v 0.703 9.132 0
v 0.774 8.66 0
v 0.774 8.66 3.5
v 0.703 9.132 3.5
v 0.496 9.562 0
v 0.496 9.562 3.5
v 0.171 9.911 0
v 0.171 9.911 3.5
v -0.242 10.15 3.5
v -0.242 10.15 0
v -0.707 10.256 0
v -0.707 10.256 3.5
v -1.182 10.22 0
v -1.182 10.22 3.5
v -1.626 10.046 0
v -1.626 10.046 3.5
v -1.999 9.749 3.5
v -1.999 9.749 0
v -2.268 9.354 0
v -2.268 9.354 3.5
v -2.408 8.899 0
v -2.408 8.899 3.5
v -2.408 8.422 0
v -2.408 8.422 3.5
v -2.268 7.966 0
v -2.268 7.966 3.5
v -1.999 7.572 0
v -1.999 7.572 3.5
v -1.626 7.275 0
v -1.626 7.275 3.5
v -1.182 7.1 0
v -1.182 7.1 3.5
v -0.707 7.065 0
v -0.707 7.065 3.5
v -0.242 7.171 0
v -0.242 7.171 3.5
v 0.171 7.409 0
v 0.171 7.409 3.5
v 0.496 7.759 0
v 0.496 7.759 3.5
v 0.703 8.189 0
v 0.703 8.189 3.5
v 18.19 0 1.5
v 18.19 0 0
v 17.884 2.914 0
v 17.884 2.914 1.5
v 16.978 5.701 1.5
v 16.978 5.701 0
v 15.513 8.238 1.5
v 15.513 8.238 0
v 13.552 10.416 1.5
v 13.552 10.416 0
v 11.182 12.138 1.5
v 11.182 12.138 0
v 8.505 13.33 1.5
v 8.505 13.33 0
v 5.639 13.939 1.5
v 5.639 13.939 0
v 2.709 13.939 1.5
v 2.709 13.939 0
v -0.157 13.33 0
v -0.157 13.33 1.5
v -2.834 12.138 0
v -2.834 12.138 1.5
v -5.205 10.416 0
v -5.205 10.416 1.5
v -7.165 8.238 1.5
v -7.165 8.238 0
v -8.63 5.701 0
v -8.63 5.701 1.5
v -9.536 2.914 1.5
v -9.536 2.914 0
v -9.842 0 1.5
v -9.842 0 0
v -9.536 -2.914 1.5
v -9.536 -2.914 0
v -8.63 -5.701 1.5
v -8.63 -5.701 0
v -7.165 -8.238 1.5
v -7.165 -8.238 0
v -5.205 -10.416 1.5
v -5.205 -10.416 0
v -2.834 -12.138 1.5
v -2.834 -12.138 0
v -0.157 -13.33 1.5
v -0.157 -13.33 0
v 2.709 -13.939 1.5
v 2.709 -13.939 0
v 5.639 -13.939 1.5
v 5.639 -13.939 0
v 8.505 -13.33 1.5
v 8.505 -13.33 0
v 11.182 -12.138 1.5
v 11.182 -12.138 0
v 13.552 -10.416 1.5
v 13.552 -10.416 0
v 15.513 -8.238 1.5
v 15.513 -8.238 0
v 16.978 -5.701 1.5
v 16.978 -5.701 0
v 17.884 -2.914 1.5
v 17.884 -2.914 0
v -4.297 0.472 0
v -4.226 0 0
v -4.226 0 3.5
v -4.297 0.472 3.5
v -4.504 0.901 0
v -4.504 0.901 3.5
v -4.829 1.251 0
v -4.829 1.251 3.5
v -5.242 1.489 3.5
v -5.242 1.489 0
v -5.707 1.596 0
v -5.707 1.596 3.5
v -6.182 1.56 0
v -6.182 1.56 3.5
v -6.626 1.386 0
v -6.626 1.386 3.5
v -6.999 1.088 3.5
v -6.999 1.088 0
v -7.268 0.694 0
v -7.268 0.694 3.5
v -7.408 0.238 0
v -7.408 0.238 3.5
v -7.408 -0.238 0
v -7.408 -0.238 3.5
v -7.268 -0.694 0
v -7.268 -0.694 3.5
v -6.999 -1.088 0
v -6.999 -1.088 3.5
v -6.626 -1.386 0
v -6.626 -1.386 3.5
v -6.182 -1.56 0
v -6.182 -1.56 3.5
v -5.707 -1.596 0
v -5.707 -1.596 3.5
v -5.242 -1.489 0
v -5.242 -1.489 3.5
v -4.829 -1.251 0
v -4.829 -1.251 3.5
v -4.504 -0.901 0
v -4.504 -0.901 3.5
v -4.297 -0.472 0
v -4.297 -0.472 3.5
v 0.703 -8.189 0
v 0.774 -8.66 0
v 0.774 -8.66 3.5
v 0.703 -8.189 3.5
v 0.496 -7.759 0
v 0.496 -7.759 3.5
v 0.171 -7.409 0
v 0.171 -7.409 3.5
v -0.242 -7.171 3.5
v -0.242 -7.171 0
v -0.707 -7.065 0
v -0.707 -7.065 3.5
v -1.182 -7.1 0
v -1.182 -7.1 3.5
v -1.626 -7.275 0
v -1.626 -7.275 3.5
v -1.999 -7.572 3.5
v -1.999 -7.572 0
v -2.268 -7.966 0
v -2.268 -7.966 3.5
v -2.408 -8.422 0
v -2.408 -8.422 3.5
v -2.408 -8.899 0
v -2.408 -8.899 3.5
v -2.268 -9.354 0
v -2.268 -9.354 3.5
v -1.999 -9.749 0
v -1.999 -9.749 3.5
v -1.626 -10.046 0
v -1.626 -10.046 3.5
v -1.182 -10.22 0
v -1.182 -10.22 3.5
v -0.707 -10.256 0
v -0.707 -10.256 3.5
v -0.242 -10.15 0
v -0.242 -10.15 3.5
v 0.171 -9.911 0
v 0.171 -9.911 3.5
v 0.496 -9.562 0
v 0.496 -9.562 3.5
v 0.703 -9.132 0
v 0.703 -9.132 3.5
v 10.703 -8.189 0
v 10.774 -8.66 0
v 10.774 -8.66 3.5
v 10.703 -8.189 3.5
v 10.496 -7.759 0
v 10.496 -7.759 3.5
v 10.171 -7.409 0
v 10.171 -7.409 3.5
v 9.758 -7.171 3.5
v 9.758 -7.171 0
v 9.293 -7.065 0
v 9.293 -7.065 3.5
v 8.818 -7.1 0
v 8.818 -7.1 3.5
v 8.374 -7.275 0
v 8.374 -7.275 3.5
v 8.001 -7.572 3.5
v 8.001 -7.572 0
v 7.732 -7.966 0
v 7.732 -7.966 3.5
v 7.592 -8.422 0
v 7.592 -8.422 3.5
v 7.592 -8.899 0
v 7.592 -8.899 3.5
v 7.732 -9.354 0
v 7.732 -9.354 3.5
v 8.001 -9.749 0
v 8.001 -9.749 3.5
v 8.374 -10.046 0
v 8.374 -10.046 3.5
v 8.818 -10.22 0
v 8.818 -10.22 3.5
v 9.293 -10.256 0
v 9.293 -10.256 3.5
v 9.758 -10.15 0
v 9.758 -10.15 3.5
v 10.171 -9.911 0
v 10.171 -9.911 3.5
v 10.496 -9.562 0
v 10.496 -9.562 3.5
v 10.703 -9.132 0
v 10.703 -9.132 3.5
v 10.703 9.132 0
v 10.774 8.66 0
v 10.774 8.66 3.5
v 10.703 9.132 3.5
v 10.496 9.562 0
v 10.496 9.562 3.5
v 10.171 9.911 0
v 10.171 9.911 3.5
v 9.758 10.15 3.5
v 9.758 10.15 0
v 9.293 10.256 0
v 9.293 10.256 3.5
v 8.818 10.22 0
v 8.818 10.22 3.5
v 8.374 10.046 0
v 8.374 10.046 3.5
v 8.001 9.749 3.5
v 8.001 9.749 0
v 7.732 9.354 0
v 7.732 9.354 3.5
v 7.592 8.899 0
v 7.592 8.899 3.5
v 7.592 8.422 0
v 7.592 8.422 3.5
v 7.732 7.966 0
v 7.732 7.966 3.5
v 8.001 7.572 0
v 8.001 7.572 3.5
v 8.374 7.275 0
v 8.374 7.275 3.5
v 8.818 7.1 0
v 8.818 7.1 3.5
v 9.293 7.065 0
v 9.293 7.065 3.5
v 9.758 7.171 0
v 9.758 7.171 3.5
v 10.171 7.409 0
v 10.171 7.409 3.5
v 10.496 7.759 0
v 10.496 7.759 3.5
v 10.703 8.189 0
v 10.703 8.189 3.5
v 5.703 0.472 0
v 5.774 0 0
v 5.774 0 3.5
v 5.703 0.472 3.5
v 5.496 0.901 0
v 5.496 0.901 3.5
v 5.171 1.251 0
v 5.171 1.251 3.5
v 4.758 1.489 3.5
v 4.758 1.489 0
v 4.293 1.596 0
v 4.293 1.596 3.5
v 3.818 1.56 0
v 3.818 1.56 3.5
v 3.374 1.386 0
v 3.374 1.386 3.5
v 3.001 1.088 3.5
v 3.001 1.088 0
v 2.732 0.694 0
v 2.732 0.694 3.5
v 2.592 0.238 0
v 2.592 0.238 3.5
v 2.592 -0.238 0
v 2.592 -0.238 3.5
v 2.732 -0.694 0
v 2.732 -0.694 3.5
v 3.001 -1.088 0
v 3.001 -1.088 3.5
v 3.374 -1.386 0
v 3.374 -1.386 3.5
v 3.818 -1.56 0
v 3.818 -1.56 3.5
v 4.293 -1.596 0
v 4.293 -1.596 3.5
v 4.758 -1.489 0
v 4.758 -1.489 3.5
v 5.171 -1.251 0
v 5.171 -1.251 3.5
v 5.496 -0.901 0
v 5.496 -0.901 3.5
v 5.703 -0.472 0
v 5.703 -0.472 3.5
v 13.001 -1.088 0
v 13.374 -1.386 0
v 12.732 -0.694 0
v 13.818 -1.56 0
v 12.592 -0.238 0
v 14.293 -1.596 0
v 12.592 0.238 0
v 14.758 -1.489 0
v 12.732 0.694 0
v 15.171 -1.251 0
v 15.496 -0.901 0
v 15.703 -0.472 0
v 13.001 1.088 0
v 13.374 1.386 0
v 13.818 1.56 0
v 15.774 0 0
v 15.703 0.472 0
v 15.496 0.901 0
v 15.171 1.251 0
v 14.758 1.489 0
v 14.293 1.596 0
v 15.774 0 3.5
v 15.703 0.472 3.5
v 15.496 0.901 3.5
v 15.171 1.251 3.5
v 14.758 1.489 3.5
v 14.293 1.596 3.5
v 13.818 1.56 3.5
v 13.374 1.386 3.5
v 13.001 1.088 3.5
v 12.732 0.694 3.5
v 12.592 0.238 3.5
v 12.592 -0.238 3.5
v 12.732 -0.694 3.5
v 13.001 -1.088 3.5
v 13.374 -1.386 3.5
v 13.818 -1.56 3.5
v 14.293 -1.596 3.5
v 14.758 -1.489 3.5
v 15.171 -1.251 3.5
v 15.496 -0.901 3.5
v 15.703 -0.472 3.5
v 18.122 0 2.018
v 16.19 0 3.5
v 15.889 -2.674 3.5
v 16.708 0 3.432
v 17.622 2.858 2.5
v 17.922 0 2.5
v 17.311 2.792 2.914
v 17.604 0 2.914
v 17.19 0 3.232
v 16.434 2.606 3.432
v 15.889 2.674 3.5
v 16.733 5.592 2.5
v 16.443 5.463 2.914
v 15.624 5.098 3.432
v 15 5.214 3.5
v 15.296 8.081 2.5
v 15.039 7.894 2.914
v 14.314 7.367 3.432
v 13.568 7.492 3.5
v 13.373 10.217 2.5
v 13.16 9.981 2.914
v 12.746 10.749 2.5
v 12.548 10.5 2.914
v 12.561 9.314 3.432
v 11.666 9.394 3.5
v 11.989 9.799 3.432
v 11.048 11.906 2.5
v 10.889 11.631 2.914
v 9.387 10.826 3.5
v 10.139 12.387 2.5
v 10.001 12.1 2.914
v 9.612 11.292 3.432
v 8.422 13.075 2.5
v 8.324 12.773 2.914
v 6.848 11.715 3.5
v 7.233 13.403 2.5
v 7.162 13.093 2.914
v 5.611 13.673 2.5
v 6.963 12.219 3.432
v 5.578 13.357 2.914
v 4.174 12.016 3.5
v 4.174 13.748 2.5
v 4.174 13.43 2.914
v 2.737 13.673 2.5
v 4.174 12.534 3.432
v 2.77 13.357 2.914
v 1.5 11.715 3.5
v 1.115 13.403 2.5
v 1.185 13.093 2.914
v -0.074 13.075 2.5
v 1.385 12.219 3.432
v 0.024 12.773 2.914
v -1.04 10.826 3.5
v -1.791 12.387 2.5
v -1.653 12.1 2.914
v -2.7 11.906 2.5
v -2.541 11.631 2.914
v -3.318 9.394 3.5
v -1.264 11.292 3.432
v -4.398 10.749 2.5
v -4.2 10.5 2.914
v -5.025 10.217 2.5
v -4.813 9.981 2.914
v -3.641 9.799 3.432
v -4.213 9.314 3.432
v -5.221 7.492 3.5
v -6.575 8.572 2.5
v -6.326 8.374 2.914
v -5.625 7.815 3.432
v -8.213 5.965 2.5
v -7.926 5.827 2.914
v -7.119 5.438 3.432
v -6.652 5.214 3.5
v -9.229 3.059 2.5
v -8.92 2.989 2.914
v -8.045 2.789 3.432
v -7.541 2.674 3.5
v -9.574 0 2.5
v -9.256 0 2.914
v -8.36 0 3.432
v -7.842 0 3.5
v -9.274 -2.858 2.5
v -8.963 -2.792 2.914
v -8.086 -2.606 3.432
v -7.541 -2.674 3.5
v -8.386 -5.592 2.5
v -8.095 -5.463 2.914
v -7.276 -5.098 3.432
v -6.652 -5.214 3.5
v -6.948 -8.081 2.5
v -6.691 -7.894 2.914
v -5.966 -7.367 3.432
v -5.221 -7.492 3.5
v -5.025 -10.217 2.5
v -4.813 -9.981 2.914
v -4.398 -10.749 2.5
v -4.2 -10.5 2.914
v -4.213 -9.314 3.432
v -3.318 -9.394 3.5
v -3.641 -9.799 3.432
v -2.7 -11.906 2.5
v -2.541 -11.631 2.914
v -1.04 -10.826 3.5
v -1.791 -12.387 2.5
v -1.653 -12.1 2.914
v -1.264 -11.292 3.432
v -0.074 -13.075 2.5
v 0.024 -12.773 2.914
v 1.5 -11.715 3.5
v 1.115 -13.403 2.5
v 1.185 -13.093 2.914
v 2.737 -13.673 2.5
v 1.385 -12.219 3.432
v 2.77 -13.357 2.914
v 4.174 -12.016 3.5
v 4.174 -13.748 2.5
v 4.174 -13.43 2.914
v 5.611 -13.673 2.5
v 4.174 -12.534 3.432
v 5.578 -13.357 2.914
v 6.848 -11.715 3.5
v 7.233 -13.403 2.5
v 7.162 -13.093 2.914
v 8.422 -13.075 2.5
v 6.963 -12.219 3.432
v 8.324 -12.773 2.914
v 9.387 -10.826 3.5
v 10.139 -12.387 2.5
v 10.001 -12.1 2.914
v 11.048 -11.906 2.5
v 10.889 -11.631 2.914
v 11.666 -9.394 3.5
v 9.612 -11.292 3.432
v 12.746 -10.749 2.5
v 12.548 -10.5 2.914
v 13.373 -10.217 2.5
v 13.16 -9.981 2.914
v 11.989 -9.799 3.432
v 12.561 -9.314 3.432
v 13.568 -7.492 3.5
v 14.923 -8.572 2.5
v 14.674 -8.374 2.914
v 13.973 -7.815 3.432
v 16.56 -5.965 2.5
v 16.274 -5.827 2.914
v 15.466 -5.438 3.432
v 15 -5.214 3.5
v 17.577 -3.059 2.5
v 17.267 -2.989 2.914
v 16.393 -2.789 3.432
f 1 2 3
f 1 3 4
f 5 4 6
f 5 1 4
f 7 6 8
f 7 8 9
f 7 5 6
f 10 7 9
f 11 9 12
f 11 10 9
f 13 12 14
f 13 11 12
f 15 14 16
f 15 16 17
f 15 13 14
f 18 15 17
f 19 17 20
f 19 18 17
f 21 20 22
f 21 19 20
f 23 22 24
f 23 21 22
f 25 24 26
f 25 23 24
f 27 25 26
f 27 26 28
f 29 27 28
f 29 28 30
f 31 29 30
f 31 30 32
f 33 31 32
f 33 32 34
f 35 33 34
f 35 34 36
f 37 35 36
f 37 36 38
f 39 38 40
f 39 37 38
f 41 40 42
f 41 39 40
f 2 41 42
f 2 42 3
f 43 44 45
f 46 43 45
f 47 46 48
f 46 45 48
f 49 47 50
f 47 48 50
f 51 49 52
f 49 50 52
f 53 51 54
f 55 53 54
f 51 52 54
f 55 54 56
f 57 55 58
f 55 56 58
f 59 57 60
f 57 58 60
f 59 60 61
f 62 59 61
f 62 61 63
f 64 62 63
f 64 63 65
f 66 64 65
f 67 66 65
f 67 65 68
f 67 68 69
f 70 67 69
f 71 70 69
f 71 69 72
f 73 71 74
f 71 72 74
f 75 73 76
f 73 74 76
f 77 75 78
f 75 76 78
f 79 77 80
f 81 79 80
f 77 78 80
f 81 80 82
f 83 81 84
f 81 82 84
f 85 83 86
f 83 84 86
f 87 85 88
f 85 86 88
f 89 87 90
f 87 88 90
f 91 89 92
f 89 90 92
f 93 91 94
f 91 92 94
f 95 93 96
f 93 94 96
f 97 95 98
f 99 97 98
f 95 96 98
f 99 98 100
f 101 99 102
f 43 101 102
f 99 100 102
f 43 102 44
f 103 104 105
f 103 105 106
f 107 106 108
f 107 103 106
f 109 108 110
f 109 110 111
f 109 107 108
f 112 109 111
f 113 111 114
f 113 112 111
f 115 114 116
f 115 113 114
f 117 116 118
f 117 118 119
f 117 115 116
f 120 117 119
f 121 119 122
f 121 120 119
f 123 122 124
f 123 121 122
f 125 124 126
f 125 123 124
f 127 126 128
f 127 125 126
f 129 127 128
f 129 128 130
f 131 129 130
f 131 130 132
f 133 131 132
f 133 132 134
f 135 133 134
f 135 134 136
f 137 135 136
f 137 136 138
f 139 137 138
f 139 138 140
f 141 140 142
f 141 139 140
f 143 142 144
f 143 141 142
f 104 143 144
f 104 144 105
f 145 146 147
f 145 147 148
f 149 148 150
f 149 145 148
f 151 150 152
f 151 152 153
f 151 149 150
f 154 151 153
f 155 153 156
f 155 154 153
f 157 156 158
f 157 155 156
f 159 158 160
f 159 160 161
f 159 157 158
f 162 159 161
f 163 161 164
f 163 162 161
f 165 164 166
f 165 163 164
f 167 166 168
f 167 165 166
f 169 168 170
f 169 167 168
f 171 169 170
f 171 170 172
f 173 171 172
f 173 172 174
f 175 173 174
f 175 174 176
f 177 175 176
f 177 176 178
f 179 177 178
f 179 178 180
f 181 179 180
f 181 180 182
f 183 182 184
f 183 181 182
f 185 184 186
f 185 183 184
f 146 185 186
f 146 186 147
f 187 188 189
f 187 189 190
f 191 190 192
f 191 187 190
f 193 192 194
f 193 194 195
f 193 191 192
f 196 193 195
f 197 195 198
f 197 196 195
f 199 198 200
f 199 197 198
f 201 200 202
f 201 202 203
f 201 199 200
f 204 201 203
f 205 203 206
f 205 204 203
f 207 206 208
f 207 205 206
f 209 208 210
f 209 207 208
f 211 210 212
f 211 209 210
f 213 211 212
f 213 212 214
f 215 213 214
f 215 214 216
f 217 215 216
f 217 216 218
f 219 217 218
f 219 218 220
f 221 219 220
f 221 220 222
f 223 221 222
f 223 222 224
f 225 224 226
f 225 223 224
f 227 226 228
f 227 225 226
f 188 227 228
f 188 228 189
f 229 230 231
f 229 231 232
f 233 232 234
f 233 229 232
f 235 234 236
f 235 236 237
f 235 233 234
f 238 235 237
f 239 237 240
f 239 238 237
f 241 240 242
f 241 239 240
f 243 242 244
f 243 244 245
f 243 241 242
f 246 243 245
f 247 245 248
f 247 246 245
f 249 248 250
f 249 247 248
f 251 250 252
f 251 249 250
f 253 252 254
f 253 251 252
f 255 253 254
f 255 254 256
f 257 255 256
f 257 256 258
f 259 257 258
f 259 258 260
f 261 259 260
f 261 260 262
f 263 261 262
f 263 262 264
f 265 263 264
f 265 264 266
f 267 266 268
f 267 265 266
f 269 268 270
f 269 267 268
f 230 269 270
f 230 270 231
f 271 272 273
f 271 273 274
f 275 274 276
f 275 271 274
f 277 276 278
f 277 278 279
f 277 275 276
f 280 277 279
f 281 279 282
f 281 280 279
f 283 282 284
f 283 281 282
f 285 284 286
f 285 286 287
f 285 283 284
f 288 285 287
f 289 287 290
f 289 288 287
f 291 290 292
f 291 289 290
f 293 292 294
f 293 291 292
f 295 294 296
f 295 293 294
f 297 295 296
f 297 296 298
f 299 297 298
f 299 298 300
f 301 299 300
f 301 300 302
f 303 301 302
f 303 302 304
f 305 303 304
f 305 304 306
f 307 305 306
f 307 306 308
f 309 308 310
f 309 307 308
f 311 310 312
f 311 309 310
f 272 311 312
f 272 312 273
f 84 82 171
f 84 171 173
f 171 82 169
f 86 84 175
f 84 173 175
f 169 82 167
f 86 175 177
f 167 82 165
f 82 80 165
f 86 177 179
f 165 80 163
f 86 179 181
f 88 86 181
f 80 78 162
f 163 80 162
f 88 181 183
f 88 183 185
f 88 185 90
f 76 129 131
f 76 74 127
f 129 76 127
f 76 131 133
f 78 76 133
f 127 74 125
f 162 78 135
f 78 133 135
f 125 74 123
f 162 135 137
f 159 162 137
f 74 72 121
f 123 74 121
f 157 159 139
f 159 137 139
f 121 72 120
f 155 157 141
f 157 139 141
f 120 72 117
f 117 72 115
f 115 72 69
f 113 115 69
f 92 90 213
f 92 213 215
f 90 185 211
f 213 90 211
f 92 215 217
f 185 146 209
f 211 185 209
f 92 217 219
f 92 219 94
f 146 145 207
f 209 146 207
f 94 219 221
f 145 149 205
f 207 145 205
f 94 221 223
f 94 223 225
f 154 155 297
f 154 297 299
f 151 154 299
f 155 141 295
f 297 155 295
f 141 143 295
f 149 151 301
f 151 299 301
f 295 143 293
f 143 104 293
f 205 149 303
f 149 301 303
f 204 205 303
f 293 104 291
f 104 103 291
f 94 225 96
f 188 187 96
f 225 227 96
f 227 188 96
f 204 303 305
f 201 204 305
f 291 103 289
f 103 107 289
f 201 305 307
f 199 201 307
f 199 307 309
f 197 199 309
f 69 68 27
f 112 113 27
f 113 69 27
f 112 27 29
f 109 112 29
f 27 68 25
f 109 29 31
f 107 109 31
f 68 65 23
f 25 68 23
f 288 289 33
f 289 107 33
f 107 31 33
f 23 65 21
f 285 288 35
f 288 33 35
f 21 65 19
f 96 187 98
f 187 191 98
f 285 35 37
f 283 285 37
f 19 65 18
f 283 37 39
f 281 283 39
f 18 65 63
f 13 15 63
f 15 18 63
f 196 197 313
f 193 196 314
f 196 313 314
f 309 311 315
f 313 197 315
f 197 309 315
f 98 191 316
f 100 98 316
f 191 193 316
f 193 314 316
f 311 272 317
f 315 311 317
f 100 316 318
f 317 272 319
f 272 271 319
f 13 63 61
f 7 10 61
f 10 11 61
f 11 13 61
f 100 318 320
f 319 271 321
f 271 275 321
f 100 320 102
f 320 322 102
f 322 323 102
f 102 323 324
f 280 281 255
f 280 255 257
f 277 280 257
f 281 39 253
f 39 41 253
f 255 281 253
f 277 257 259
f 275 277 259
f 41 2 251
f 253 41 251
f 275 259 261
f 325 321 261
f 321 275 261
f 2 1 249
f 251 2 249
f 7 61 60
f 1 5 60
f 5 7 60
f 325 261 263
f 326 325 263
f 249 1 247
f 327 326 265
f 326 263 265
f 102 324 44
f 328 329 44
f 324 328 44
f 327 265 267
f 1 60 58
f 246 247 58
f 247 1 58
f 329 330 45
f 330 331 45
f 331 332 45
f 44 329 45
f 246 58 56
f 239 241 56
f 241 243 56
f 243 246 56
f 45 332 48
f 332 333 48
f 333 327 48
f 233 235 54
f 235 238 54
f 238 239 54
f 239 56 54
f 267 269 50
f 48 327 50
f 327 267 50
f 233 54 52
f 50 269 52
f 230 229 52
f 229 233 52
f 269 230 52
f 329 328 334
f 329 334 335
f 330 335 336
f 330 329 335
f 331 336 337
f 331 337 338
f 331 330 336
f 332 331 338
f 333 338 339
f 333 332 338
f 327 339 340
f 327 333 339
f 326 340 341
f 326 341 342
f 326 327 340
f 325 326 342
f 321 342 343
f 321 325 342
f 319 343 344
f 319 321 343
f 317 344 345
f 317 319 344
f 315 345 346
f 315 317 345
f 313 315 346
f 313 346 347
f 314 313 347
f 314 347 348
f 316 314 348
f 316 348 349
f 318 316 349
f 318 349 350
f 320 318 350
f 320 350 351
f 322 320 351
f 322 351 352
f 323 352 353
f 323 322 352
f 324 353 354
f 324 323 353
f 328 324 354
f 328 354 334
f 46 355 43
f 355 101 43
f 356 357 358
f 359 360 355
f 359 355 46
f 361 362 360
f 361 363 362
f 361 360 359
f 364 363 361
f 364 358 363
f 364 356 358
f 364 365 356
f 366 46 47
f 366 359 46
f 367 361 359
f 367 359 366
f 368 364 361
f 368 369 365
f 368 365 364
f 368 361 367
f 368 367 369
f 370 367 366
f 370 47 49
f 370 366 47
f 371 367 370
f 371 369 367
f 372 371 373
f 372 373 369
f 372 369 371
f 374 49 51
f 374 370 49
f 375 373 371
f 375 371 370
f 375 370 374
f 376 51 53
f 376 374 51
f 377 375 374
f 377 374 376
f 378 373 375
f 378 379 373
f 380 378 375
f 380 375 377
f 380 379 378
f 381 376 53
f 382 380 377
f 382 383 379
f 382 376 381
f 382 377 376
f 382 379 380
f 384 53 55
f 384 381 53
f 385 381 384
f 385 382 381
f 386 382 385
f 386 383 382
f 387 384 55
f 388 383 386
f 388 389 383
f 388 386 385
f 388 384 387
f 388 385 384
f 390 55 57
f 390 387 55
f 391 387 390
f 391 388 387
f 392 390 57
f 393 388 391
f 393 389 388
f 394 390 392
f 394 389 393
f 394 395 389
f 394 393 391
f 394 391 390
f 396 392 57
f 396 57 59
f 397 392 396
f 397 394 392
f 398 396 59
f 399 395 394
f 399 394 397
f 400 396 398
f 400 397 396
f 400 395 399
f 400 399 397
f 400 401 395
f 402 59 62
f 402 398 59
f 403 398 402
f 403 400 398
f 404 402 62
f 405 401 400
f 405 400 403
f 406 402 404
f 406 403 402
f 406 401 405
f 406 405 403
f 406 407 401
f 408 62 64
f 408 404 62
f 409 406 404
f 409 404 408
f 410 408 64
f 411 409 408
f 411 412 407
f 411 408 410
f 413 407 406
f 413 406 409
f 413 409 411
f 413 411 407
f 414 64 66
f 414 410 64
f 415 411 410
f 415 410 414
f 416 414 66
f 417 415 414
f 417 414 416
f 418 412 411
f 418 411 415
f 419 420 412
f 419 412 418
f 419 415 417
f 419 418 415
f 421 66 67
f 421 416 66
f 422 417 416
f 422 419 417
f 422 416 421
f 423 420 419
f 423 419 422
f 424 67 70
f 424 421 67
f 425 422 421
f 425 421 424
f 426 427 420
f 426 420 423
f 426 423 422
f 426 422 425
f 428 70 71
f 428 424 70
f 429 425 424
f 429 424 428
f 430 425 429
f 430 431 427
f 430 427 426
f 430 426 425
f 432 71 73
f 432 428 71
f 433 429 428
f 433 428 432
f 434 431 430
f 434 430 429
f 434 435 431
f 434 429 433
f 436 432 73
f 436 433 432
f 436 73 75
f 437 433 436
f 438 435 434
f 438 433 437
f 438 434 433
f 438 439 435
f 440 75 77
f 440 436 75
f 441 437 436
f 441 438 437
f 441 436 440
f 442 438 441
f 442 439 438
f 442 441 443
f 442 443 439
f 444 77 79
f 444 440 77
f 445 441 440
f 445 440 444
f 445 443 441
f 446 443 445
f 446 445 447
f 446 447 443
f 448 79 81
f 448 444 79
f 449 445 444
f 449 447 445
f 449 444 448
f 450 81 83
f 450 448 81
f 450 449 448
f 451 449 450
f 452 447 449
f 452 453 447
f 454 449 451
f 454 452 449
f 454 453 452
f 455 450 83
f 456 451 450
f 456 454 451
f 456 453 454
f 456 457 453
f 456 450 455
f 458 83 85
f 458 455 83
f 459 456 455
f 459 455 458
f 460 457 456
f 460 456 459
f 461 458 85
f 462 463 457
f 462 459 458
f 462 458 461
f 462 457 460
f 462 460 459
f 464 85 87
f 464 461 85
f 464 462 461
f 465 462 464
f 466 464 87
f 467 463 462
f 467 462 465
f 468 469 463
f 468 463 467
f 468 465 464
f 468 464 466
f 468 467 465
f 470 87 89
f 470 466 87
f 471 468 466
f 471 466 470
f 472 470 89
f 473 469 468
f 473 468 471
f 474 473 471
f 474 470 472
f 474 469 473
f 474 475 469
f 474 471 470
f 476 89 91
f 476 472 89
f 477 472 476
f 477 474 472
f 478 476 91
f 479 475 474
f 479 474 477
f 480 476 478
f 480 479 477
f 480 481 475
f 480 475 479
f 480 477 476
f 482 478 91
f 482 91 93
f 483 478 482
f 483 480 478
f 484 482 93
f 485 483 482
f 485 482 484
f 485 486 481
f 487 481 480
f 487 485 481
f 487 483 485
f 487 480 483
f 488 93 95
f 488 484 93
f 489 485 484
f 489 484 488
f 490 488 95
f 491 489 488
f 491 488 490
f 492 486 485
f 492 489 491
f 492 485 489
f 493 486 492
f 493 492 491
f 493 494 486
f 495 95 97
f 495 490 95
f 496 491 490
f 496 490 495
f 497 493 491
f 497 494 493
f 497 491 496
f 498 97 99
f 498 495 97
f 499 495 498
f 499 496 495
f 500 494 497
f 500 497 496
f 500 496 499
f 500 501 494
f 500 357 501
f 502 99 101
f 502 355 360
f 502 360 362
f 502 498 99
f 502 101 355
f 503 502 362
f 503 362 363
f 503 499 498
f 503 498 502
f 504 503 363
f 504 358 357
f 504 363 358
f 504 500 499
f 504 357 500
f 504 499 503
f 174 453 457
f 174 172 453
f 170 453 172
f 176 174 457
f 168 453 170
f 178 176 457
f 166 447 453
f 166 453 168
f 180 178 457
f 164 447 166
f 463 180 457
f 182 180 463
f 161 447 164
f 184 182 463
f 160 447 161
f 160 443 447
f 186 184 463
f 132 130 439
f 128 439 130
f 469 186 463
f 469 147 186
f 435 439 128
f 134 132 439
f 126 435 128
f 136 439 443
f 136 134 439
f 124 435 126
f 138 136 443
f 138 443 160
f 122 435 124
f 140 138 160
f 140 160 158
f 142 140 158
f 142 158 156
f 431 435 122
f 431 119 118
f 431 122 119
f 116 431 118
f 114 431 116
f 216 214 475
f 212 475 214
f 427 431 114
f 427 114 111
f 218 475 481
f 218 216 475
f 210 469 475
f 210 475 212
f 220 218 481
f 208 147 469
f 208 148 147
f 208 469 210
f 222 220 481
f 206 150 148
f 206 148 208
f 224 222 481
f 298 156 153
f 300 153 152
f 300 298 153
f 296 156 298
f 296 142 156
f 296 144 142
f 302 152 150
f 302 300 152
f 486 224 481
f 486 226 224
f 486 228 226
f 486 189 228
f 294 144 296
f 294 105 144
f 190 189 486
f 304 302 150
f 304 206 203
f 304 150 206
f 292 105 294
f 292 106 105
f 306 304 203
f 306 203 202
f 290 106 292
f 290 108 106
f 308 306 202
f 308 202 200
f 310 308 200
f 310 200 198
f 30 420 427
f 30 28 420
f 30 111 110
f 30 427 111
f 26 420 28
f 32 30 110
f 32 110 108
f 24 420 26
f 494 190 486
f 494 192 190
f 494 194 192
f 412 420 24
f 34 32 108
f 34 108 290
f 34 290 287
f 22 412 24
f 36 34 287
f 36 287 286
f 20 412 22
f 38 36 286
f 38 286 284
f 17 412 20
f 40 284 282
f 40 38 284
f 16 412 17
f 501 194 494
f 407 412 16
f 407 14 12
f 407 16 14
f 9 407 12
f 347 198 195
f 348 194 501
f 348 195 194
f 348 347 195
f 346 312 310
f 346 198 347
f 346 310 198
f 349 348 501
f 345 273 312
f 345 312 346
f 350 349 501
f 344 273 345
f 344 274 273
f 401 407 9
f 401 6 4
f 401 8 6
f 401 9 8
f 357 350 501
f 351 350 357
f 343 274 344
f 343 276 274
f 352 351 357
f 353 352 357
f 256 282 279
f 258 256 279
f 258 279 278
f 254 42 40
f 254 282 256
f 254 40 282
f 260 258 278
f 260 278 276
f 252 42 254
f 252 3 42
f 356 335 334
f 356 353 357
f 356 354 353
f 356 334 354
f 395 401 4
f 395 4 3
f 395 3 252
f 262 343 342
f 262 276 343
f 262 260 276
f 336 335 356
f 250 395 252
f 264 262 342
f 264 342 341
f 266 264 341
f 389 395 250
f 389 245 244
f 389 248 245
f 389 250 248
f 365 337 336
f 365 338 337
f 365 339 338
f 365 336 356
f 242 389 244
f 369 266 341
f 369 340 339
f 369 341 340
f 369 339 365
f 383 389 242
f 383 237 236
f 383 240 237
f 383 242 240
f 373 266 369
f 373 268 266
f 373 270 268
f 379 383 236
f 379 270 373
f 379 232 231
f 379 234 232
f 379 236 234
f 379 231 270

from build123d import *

# Parameters (mm, degrees)
F0_R     = 14.0159979079
F0_R_2   = 1.6
F1_DEPTH = 3.5
F2_R     = 2


# Not quite as in the source:
# - a feature names something its author has since deleted; it is built from what else it names


with BuildPart() as f1:
    # F0 (on Top) → F1 (new body)
    with BuildSketch(Plane.XY):
        with Locations((4.1739126741, 0)):
            Circle(F0_R)
        with Locations((-0.8260871004, -8.6602539076)):
            Circle(F0_R_2, mode=Mode.SUBTRACT)
        with Locations((-5.8260870252, 0)):
            Circle(F0_R_2, mode=Mode.SUBTRACT)
        with Locations((4.1739126741, 0)):
            Circle(F0_R_2, mode=Mode.SUBTRACT)
        with Locations((9.1739127493, -8.6602539076)):
            Circle(F0_R_2, mode=Mode.SUBTRACT)
        with Locations((14.1739126741, 0)):
            Circle(F0_R_2, mode=Mode.SUBTRACT)
        with Locations((-0.8260871004, 8.6602539076)):
            Circle(F0_R_2, mode=Mode.SUBTRACT)
        with Locations((9.1739127493, 8.6602539076)):
            Circle(F0_R_2, mode=Mode.SUBTRACT)
    extrude(amount=F1_DEPTH)

    # F2
    f2_edges = [f1.edges().sort_by_distance(p)[0] for p in [
        (-9.842085, 0, 3.5),
    ]]
    fillet(f2_edges, radius=F2_R)


solid = f1.part
